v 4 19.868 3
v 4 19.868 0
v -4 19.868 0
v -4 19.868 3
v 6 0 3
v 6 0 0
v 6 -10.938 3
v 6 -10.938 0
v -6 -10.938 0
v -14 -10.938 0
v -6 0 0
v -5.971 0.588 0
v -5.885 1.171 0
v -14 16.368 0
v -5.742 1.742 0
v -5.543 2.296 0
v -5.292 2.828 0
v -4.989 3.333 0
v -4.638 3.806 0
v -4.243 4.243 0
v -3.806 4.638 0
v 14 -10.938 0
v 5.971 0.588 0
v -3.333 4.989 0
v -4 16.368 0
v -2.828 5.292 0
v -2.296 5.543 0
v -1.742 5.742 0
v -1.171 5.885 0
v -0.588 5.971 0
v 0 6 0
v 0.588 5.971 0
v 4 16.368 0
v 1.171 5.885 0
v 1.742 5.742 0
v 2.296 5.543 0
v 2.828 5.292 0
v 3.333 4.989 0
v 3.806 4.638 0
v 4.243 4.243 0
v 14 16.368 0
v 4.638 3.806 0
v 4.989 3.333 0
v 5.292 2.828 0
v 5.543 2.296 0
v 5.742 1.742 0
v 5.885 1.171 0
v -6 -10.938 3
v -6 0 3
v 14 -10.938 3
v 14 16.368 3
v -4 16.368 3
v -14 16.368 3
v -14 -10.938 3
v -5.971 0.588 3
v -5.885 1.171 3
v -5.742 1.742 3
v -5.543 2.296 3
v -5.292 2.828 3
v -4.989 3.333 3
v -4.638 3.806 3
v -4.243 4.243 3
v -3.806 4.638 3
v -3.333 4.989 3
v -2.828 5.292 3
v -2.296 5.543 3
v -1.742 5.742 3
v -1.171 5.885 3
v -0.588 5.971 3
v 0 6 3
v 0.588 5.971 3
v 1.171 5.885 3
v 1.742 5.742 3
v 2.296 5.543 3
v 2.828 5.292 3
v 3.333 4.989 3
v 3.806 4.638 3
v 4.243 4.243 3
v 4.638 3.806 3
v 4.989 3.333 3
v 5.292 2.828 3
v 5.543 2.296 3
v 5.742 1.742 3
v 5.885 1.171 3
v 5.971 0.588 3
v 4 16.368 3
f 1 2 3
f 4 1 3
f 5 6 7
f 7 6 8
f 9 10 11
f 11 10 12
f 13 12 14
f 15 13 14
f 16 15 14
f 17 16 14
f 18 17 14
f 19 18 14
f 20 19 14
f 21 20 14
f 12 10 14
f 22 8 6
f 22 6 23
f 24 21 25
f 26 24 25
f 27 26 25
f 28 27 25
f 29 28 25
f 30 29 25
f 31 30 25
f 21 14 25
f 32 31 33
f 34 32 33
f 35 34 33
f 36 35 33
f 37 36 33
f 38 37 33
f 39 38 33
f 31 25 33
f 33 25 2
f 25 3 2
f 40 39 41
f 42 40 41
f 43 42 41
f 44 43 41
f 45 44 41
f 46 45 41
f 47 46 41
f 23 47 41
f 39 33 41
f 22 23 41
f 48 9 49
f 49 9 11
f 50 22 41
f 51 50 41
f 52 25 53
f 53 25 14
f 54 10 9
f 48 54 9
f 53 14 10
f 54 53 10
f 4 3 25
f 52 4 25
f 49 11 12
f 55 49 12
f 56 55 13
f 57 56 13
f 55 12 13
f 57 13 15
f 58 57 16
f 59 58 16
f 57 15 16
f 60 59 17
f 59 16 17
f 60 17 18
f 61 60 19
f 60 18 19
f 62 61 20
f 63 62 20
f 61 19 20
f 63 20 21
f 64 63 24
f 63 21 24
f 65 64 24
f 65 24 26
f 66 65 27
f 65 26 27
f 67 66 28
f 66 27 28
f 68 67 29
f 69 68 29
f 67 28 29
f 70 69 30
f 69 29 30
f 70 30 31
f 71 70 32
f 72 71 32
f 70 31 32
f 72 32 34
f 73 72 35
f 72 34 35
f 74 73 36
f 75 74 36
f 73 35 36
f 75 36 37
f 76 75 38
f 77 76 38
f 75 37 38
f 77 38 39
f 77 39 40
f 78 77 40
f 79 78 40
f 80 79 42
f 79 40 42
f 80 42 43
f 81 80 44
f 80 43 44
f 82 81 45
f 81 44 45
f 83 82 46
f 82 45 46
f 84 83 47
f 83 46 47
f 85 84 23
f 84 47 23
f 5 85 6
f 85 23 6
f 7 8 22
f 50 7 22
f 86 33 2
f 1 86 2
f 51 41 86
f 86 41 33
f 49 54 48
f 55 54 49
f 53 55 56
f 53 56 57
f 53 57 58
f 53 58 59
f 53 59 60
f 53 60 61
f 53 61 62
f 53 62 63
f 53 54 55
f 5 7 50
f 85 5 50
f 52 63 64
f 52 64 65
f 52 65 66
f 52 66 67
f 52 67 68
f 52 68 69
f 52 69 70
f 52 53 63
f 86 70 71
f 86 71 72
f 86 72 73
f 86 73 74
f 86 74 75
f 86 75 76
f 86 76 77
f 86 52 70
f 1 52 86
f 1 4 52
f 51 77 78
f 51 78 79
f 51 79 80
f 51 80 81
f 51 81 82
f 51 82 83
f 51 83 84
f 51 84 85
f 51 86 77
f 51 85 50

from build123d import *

# Parameters (mm, degrees)
RESSALTO_EXTRUS_O1_DEPTH = 3


with BuildPart() as part:
    # Esboço9 → Ressalto-extrusão1 (new body)
    with BuildSketch(Plane.XY):
        with BuildLine():
            Line((-14, -10.9375), (-6, -10.9375))
            Line((-6, -10.9375), (-6, 0))
            ThreePointArc((-6, 0), (0, 6), (6, 0))
            Line((6, 0), (6, -10.9375))
            Line((6, -10.9375), (14, -10.9375))
            Line((14, -10.9375), (14, 16.367680587))
            Line((14, 16.367680587), (4, 16.367680587))
            Line((4, 16.367680587), (4, 19.867680587))
            Line((4, 19.867680587), (-4, 19.867680587))
            Line((-4, 19.867680587), (-4, 16.367680587))
            Line((-4, 16.367680587), (-14, 16.367680587))
            Line((-14, 16.367680587), (-14, -10.9375))
        make_face()
    extrude(amount=RESSALTO_EXTRUS_O1_DEPTH)


solid = part.part
